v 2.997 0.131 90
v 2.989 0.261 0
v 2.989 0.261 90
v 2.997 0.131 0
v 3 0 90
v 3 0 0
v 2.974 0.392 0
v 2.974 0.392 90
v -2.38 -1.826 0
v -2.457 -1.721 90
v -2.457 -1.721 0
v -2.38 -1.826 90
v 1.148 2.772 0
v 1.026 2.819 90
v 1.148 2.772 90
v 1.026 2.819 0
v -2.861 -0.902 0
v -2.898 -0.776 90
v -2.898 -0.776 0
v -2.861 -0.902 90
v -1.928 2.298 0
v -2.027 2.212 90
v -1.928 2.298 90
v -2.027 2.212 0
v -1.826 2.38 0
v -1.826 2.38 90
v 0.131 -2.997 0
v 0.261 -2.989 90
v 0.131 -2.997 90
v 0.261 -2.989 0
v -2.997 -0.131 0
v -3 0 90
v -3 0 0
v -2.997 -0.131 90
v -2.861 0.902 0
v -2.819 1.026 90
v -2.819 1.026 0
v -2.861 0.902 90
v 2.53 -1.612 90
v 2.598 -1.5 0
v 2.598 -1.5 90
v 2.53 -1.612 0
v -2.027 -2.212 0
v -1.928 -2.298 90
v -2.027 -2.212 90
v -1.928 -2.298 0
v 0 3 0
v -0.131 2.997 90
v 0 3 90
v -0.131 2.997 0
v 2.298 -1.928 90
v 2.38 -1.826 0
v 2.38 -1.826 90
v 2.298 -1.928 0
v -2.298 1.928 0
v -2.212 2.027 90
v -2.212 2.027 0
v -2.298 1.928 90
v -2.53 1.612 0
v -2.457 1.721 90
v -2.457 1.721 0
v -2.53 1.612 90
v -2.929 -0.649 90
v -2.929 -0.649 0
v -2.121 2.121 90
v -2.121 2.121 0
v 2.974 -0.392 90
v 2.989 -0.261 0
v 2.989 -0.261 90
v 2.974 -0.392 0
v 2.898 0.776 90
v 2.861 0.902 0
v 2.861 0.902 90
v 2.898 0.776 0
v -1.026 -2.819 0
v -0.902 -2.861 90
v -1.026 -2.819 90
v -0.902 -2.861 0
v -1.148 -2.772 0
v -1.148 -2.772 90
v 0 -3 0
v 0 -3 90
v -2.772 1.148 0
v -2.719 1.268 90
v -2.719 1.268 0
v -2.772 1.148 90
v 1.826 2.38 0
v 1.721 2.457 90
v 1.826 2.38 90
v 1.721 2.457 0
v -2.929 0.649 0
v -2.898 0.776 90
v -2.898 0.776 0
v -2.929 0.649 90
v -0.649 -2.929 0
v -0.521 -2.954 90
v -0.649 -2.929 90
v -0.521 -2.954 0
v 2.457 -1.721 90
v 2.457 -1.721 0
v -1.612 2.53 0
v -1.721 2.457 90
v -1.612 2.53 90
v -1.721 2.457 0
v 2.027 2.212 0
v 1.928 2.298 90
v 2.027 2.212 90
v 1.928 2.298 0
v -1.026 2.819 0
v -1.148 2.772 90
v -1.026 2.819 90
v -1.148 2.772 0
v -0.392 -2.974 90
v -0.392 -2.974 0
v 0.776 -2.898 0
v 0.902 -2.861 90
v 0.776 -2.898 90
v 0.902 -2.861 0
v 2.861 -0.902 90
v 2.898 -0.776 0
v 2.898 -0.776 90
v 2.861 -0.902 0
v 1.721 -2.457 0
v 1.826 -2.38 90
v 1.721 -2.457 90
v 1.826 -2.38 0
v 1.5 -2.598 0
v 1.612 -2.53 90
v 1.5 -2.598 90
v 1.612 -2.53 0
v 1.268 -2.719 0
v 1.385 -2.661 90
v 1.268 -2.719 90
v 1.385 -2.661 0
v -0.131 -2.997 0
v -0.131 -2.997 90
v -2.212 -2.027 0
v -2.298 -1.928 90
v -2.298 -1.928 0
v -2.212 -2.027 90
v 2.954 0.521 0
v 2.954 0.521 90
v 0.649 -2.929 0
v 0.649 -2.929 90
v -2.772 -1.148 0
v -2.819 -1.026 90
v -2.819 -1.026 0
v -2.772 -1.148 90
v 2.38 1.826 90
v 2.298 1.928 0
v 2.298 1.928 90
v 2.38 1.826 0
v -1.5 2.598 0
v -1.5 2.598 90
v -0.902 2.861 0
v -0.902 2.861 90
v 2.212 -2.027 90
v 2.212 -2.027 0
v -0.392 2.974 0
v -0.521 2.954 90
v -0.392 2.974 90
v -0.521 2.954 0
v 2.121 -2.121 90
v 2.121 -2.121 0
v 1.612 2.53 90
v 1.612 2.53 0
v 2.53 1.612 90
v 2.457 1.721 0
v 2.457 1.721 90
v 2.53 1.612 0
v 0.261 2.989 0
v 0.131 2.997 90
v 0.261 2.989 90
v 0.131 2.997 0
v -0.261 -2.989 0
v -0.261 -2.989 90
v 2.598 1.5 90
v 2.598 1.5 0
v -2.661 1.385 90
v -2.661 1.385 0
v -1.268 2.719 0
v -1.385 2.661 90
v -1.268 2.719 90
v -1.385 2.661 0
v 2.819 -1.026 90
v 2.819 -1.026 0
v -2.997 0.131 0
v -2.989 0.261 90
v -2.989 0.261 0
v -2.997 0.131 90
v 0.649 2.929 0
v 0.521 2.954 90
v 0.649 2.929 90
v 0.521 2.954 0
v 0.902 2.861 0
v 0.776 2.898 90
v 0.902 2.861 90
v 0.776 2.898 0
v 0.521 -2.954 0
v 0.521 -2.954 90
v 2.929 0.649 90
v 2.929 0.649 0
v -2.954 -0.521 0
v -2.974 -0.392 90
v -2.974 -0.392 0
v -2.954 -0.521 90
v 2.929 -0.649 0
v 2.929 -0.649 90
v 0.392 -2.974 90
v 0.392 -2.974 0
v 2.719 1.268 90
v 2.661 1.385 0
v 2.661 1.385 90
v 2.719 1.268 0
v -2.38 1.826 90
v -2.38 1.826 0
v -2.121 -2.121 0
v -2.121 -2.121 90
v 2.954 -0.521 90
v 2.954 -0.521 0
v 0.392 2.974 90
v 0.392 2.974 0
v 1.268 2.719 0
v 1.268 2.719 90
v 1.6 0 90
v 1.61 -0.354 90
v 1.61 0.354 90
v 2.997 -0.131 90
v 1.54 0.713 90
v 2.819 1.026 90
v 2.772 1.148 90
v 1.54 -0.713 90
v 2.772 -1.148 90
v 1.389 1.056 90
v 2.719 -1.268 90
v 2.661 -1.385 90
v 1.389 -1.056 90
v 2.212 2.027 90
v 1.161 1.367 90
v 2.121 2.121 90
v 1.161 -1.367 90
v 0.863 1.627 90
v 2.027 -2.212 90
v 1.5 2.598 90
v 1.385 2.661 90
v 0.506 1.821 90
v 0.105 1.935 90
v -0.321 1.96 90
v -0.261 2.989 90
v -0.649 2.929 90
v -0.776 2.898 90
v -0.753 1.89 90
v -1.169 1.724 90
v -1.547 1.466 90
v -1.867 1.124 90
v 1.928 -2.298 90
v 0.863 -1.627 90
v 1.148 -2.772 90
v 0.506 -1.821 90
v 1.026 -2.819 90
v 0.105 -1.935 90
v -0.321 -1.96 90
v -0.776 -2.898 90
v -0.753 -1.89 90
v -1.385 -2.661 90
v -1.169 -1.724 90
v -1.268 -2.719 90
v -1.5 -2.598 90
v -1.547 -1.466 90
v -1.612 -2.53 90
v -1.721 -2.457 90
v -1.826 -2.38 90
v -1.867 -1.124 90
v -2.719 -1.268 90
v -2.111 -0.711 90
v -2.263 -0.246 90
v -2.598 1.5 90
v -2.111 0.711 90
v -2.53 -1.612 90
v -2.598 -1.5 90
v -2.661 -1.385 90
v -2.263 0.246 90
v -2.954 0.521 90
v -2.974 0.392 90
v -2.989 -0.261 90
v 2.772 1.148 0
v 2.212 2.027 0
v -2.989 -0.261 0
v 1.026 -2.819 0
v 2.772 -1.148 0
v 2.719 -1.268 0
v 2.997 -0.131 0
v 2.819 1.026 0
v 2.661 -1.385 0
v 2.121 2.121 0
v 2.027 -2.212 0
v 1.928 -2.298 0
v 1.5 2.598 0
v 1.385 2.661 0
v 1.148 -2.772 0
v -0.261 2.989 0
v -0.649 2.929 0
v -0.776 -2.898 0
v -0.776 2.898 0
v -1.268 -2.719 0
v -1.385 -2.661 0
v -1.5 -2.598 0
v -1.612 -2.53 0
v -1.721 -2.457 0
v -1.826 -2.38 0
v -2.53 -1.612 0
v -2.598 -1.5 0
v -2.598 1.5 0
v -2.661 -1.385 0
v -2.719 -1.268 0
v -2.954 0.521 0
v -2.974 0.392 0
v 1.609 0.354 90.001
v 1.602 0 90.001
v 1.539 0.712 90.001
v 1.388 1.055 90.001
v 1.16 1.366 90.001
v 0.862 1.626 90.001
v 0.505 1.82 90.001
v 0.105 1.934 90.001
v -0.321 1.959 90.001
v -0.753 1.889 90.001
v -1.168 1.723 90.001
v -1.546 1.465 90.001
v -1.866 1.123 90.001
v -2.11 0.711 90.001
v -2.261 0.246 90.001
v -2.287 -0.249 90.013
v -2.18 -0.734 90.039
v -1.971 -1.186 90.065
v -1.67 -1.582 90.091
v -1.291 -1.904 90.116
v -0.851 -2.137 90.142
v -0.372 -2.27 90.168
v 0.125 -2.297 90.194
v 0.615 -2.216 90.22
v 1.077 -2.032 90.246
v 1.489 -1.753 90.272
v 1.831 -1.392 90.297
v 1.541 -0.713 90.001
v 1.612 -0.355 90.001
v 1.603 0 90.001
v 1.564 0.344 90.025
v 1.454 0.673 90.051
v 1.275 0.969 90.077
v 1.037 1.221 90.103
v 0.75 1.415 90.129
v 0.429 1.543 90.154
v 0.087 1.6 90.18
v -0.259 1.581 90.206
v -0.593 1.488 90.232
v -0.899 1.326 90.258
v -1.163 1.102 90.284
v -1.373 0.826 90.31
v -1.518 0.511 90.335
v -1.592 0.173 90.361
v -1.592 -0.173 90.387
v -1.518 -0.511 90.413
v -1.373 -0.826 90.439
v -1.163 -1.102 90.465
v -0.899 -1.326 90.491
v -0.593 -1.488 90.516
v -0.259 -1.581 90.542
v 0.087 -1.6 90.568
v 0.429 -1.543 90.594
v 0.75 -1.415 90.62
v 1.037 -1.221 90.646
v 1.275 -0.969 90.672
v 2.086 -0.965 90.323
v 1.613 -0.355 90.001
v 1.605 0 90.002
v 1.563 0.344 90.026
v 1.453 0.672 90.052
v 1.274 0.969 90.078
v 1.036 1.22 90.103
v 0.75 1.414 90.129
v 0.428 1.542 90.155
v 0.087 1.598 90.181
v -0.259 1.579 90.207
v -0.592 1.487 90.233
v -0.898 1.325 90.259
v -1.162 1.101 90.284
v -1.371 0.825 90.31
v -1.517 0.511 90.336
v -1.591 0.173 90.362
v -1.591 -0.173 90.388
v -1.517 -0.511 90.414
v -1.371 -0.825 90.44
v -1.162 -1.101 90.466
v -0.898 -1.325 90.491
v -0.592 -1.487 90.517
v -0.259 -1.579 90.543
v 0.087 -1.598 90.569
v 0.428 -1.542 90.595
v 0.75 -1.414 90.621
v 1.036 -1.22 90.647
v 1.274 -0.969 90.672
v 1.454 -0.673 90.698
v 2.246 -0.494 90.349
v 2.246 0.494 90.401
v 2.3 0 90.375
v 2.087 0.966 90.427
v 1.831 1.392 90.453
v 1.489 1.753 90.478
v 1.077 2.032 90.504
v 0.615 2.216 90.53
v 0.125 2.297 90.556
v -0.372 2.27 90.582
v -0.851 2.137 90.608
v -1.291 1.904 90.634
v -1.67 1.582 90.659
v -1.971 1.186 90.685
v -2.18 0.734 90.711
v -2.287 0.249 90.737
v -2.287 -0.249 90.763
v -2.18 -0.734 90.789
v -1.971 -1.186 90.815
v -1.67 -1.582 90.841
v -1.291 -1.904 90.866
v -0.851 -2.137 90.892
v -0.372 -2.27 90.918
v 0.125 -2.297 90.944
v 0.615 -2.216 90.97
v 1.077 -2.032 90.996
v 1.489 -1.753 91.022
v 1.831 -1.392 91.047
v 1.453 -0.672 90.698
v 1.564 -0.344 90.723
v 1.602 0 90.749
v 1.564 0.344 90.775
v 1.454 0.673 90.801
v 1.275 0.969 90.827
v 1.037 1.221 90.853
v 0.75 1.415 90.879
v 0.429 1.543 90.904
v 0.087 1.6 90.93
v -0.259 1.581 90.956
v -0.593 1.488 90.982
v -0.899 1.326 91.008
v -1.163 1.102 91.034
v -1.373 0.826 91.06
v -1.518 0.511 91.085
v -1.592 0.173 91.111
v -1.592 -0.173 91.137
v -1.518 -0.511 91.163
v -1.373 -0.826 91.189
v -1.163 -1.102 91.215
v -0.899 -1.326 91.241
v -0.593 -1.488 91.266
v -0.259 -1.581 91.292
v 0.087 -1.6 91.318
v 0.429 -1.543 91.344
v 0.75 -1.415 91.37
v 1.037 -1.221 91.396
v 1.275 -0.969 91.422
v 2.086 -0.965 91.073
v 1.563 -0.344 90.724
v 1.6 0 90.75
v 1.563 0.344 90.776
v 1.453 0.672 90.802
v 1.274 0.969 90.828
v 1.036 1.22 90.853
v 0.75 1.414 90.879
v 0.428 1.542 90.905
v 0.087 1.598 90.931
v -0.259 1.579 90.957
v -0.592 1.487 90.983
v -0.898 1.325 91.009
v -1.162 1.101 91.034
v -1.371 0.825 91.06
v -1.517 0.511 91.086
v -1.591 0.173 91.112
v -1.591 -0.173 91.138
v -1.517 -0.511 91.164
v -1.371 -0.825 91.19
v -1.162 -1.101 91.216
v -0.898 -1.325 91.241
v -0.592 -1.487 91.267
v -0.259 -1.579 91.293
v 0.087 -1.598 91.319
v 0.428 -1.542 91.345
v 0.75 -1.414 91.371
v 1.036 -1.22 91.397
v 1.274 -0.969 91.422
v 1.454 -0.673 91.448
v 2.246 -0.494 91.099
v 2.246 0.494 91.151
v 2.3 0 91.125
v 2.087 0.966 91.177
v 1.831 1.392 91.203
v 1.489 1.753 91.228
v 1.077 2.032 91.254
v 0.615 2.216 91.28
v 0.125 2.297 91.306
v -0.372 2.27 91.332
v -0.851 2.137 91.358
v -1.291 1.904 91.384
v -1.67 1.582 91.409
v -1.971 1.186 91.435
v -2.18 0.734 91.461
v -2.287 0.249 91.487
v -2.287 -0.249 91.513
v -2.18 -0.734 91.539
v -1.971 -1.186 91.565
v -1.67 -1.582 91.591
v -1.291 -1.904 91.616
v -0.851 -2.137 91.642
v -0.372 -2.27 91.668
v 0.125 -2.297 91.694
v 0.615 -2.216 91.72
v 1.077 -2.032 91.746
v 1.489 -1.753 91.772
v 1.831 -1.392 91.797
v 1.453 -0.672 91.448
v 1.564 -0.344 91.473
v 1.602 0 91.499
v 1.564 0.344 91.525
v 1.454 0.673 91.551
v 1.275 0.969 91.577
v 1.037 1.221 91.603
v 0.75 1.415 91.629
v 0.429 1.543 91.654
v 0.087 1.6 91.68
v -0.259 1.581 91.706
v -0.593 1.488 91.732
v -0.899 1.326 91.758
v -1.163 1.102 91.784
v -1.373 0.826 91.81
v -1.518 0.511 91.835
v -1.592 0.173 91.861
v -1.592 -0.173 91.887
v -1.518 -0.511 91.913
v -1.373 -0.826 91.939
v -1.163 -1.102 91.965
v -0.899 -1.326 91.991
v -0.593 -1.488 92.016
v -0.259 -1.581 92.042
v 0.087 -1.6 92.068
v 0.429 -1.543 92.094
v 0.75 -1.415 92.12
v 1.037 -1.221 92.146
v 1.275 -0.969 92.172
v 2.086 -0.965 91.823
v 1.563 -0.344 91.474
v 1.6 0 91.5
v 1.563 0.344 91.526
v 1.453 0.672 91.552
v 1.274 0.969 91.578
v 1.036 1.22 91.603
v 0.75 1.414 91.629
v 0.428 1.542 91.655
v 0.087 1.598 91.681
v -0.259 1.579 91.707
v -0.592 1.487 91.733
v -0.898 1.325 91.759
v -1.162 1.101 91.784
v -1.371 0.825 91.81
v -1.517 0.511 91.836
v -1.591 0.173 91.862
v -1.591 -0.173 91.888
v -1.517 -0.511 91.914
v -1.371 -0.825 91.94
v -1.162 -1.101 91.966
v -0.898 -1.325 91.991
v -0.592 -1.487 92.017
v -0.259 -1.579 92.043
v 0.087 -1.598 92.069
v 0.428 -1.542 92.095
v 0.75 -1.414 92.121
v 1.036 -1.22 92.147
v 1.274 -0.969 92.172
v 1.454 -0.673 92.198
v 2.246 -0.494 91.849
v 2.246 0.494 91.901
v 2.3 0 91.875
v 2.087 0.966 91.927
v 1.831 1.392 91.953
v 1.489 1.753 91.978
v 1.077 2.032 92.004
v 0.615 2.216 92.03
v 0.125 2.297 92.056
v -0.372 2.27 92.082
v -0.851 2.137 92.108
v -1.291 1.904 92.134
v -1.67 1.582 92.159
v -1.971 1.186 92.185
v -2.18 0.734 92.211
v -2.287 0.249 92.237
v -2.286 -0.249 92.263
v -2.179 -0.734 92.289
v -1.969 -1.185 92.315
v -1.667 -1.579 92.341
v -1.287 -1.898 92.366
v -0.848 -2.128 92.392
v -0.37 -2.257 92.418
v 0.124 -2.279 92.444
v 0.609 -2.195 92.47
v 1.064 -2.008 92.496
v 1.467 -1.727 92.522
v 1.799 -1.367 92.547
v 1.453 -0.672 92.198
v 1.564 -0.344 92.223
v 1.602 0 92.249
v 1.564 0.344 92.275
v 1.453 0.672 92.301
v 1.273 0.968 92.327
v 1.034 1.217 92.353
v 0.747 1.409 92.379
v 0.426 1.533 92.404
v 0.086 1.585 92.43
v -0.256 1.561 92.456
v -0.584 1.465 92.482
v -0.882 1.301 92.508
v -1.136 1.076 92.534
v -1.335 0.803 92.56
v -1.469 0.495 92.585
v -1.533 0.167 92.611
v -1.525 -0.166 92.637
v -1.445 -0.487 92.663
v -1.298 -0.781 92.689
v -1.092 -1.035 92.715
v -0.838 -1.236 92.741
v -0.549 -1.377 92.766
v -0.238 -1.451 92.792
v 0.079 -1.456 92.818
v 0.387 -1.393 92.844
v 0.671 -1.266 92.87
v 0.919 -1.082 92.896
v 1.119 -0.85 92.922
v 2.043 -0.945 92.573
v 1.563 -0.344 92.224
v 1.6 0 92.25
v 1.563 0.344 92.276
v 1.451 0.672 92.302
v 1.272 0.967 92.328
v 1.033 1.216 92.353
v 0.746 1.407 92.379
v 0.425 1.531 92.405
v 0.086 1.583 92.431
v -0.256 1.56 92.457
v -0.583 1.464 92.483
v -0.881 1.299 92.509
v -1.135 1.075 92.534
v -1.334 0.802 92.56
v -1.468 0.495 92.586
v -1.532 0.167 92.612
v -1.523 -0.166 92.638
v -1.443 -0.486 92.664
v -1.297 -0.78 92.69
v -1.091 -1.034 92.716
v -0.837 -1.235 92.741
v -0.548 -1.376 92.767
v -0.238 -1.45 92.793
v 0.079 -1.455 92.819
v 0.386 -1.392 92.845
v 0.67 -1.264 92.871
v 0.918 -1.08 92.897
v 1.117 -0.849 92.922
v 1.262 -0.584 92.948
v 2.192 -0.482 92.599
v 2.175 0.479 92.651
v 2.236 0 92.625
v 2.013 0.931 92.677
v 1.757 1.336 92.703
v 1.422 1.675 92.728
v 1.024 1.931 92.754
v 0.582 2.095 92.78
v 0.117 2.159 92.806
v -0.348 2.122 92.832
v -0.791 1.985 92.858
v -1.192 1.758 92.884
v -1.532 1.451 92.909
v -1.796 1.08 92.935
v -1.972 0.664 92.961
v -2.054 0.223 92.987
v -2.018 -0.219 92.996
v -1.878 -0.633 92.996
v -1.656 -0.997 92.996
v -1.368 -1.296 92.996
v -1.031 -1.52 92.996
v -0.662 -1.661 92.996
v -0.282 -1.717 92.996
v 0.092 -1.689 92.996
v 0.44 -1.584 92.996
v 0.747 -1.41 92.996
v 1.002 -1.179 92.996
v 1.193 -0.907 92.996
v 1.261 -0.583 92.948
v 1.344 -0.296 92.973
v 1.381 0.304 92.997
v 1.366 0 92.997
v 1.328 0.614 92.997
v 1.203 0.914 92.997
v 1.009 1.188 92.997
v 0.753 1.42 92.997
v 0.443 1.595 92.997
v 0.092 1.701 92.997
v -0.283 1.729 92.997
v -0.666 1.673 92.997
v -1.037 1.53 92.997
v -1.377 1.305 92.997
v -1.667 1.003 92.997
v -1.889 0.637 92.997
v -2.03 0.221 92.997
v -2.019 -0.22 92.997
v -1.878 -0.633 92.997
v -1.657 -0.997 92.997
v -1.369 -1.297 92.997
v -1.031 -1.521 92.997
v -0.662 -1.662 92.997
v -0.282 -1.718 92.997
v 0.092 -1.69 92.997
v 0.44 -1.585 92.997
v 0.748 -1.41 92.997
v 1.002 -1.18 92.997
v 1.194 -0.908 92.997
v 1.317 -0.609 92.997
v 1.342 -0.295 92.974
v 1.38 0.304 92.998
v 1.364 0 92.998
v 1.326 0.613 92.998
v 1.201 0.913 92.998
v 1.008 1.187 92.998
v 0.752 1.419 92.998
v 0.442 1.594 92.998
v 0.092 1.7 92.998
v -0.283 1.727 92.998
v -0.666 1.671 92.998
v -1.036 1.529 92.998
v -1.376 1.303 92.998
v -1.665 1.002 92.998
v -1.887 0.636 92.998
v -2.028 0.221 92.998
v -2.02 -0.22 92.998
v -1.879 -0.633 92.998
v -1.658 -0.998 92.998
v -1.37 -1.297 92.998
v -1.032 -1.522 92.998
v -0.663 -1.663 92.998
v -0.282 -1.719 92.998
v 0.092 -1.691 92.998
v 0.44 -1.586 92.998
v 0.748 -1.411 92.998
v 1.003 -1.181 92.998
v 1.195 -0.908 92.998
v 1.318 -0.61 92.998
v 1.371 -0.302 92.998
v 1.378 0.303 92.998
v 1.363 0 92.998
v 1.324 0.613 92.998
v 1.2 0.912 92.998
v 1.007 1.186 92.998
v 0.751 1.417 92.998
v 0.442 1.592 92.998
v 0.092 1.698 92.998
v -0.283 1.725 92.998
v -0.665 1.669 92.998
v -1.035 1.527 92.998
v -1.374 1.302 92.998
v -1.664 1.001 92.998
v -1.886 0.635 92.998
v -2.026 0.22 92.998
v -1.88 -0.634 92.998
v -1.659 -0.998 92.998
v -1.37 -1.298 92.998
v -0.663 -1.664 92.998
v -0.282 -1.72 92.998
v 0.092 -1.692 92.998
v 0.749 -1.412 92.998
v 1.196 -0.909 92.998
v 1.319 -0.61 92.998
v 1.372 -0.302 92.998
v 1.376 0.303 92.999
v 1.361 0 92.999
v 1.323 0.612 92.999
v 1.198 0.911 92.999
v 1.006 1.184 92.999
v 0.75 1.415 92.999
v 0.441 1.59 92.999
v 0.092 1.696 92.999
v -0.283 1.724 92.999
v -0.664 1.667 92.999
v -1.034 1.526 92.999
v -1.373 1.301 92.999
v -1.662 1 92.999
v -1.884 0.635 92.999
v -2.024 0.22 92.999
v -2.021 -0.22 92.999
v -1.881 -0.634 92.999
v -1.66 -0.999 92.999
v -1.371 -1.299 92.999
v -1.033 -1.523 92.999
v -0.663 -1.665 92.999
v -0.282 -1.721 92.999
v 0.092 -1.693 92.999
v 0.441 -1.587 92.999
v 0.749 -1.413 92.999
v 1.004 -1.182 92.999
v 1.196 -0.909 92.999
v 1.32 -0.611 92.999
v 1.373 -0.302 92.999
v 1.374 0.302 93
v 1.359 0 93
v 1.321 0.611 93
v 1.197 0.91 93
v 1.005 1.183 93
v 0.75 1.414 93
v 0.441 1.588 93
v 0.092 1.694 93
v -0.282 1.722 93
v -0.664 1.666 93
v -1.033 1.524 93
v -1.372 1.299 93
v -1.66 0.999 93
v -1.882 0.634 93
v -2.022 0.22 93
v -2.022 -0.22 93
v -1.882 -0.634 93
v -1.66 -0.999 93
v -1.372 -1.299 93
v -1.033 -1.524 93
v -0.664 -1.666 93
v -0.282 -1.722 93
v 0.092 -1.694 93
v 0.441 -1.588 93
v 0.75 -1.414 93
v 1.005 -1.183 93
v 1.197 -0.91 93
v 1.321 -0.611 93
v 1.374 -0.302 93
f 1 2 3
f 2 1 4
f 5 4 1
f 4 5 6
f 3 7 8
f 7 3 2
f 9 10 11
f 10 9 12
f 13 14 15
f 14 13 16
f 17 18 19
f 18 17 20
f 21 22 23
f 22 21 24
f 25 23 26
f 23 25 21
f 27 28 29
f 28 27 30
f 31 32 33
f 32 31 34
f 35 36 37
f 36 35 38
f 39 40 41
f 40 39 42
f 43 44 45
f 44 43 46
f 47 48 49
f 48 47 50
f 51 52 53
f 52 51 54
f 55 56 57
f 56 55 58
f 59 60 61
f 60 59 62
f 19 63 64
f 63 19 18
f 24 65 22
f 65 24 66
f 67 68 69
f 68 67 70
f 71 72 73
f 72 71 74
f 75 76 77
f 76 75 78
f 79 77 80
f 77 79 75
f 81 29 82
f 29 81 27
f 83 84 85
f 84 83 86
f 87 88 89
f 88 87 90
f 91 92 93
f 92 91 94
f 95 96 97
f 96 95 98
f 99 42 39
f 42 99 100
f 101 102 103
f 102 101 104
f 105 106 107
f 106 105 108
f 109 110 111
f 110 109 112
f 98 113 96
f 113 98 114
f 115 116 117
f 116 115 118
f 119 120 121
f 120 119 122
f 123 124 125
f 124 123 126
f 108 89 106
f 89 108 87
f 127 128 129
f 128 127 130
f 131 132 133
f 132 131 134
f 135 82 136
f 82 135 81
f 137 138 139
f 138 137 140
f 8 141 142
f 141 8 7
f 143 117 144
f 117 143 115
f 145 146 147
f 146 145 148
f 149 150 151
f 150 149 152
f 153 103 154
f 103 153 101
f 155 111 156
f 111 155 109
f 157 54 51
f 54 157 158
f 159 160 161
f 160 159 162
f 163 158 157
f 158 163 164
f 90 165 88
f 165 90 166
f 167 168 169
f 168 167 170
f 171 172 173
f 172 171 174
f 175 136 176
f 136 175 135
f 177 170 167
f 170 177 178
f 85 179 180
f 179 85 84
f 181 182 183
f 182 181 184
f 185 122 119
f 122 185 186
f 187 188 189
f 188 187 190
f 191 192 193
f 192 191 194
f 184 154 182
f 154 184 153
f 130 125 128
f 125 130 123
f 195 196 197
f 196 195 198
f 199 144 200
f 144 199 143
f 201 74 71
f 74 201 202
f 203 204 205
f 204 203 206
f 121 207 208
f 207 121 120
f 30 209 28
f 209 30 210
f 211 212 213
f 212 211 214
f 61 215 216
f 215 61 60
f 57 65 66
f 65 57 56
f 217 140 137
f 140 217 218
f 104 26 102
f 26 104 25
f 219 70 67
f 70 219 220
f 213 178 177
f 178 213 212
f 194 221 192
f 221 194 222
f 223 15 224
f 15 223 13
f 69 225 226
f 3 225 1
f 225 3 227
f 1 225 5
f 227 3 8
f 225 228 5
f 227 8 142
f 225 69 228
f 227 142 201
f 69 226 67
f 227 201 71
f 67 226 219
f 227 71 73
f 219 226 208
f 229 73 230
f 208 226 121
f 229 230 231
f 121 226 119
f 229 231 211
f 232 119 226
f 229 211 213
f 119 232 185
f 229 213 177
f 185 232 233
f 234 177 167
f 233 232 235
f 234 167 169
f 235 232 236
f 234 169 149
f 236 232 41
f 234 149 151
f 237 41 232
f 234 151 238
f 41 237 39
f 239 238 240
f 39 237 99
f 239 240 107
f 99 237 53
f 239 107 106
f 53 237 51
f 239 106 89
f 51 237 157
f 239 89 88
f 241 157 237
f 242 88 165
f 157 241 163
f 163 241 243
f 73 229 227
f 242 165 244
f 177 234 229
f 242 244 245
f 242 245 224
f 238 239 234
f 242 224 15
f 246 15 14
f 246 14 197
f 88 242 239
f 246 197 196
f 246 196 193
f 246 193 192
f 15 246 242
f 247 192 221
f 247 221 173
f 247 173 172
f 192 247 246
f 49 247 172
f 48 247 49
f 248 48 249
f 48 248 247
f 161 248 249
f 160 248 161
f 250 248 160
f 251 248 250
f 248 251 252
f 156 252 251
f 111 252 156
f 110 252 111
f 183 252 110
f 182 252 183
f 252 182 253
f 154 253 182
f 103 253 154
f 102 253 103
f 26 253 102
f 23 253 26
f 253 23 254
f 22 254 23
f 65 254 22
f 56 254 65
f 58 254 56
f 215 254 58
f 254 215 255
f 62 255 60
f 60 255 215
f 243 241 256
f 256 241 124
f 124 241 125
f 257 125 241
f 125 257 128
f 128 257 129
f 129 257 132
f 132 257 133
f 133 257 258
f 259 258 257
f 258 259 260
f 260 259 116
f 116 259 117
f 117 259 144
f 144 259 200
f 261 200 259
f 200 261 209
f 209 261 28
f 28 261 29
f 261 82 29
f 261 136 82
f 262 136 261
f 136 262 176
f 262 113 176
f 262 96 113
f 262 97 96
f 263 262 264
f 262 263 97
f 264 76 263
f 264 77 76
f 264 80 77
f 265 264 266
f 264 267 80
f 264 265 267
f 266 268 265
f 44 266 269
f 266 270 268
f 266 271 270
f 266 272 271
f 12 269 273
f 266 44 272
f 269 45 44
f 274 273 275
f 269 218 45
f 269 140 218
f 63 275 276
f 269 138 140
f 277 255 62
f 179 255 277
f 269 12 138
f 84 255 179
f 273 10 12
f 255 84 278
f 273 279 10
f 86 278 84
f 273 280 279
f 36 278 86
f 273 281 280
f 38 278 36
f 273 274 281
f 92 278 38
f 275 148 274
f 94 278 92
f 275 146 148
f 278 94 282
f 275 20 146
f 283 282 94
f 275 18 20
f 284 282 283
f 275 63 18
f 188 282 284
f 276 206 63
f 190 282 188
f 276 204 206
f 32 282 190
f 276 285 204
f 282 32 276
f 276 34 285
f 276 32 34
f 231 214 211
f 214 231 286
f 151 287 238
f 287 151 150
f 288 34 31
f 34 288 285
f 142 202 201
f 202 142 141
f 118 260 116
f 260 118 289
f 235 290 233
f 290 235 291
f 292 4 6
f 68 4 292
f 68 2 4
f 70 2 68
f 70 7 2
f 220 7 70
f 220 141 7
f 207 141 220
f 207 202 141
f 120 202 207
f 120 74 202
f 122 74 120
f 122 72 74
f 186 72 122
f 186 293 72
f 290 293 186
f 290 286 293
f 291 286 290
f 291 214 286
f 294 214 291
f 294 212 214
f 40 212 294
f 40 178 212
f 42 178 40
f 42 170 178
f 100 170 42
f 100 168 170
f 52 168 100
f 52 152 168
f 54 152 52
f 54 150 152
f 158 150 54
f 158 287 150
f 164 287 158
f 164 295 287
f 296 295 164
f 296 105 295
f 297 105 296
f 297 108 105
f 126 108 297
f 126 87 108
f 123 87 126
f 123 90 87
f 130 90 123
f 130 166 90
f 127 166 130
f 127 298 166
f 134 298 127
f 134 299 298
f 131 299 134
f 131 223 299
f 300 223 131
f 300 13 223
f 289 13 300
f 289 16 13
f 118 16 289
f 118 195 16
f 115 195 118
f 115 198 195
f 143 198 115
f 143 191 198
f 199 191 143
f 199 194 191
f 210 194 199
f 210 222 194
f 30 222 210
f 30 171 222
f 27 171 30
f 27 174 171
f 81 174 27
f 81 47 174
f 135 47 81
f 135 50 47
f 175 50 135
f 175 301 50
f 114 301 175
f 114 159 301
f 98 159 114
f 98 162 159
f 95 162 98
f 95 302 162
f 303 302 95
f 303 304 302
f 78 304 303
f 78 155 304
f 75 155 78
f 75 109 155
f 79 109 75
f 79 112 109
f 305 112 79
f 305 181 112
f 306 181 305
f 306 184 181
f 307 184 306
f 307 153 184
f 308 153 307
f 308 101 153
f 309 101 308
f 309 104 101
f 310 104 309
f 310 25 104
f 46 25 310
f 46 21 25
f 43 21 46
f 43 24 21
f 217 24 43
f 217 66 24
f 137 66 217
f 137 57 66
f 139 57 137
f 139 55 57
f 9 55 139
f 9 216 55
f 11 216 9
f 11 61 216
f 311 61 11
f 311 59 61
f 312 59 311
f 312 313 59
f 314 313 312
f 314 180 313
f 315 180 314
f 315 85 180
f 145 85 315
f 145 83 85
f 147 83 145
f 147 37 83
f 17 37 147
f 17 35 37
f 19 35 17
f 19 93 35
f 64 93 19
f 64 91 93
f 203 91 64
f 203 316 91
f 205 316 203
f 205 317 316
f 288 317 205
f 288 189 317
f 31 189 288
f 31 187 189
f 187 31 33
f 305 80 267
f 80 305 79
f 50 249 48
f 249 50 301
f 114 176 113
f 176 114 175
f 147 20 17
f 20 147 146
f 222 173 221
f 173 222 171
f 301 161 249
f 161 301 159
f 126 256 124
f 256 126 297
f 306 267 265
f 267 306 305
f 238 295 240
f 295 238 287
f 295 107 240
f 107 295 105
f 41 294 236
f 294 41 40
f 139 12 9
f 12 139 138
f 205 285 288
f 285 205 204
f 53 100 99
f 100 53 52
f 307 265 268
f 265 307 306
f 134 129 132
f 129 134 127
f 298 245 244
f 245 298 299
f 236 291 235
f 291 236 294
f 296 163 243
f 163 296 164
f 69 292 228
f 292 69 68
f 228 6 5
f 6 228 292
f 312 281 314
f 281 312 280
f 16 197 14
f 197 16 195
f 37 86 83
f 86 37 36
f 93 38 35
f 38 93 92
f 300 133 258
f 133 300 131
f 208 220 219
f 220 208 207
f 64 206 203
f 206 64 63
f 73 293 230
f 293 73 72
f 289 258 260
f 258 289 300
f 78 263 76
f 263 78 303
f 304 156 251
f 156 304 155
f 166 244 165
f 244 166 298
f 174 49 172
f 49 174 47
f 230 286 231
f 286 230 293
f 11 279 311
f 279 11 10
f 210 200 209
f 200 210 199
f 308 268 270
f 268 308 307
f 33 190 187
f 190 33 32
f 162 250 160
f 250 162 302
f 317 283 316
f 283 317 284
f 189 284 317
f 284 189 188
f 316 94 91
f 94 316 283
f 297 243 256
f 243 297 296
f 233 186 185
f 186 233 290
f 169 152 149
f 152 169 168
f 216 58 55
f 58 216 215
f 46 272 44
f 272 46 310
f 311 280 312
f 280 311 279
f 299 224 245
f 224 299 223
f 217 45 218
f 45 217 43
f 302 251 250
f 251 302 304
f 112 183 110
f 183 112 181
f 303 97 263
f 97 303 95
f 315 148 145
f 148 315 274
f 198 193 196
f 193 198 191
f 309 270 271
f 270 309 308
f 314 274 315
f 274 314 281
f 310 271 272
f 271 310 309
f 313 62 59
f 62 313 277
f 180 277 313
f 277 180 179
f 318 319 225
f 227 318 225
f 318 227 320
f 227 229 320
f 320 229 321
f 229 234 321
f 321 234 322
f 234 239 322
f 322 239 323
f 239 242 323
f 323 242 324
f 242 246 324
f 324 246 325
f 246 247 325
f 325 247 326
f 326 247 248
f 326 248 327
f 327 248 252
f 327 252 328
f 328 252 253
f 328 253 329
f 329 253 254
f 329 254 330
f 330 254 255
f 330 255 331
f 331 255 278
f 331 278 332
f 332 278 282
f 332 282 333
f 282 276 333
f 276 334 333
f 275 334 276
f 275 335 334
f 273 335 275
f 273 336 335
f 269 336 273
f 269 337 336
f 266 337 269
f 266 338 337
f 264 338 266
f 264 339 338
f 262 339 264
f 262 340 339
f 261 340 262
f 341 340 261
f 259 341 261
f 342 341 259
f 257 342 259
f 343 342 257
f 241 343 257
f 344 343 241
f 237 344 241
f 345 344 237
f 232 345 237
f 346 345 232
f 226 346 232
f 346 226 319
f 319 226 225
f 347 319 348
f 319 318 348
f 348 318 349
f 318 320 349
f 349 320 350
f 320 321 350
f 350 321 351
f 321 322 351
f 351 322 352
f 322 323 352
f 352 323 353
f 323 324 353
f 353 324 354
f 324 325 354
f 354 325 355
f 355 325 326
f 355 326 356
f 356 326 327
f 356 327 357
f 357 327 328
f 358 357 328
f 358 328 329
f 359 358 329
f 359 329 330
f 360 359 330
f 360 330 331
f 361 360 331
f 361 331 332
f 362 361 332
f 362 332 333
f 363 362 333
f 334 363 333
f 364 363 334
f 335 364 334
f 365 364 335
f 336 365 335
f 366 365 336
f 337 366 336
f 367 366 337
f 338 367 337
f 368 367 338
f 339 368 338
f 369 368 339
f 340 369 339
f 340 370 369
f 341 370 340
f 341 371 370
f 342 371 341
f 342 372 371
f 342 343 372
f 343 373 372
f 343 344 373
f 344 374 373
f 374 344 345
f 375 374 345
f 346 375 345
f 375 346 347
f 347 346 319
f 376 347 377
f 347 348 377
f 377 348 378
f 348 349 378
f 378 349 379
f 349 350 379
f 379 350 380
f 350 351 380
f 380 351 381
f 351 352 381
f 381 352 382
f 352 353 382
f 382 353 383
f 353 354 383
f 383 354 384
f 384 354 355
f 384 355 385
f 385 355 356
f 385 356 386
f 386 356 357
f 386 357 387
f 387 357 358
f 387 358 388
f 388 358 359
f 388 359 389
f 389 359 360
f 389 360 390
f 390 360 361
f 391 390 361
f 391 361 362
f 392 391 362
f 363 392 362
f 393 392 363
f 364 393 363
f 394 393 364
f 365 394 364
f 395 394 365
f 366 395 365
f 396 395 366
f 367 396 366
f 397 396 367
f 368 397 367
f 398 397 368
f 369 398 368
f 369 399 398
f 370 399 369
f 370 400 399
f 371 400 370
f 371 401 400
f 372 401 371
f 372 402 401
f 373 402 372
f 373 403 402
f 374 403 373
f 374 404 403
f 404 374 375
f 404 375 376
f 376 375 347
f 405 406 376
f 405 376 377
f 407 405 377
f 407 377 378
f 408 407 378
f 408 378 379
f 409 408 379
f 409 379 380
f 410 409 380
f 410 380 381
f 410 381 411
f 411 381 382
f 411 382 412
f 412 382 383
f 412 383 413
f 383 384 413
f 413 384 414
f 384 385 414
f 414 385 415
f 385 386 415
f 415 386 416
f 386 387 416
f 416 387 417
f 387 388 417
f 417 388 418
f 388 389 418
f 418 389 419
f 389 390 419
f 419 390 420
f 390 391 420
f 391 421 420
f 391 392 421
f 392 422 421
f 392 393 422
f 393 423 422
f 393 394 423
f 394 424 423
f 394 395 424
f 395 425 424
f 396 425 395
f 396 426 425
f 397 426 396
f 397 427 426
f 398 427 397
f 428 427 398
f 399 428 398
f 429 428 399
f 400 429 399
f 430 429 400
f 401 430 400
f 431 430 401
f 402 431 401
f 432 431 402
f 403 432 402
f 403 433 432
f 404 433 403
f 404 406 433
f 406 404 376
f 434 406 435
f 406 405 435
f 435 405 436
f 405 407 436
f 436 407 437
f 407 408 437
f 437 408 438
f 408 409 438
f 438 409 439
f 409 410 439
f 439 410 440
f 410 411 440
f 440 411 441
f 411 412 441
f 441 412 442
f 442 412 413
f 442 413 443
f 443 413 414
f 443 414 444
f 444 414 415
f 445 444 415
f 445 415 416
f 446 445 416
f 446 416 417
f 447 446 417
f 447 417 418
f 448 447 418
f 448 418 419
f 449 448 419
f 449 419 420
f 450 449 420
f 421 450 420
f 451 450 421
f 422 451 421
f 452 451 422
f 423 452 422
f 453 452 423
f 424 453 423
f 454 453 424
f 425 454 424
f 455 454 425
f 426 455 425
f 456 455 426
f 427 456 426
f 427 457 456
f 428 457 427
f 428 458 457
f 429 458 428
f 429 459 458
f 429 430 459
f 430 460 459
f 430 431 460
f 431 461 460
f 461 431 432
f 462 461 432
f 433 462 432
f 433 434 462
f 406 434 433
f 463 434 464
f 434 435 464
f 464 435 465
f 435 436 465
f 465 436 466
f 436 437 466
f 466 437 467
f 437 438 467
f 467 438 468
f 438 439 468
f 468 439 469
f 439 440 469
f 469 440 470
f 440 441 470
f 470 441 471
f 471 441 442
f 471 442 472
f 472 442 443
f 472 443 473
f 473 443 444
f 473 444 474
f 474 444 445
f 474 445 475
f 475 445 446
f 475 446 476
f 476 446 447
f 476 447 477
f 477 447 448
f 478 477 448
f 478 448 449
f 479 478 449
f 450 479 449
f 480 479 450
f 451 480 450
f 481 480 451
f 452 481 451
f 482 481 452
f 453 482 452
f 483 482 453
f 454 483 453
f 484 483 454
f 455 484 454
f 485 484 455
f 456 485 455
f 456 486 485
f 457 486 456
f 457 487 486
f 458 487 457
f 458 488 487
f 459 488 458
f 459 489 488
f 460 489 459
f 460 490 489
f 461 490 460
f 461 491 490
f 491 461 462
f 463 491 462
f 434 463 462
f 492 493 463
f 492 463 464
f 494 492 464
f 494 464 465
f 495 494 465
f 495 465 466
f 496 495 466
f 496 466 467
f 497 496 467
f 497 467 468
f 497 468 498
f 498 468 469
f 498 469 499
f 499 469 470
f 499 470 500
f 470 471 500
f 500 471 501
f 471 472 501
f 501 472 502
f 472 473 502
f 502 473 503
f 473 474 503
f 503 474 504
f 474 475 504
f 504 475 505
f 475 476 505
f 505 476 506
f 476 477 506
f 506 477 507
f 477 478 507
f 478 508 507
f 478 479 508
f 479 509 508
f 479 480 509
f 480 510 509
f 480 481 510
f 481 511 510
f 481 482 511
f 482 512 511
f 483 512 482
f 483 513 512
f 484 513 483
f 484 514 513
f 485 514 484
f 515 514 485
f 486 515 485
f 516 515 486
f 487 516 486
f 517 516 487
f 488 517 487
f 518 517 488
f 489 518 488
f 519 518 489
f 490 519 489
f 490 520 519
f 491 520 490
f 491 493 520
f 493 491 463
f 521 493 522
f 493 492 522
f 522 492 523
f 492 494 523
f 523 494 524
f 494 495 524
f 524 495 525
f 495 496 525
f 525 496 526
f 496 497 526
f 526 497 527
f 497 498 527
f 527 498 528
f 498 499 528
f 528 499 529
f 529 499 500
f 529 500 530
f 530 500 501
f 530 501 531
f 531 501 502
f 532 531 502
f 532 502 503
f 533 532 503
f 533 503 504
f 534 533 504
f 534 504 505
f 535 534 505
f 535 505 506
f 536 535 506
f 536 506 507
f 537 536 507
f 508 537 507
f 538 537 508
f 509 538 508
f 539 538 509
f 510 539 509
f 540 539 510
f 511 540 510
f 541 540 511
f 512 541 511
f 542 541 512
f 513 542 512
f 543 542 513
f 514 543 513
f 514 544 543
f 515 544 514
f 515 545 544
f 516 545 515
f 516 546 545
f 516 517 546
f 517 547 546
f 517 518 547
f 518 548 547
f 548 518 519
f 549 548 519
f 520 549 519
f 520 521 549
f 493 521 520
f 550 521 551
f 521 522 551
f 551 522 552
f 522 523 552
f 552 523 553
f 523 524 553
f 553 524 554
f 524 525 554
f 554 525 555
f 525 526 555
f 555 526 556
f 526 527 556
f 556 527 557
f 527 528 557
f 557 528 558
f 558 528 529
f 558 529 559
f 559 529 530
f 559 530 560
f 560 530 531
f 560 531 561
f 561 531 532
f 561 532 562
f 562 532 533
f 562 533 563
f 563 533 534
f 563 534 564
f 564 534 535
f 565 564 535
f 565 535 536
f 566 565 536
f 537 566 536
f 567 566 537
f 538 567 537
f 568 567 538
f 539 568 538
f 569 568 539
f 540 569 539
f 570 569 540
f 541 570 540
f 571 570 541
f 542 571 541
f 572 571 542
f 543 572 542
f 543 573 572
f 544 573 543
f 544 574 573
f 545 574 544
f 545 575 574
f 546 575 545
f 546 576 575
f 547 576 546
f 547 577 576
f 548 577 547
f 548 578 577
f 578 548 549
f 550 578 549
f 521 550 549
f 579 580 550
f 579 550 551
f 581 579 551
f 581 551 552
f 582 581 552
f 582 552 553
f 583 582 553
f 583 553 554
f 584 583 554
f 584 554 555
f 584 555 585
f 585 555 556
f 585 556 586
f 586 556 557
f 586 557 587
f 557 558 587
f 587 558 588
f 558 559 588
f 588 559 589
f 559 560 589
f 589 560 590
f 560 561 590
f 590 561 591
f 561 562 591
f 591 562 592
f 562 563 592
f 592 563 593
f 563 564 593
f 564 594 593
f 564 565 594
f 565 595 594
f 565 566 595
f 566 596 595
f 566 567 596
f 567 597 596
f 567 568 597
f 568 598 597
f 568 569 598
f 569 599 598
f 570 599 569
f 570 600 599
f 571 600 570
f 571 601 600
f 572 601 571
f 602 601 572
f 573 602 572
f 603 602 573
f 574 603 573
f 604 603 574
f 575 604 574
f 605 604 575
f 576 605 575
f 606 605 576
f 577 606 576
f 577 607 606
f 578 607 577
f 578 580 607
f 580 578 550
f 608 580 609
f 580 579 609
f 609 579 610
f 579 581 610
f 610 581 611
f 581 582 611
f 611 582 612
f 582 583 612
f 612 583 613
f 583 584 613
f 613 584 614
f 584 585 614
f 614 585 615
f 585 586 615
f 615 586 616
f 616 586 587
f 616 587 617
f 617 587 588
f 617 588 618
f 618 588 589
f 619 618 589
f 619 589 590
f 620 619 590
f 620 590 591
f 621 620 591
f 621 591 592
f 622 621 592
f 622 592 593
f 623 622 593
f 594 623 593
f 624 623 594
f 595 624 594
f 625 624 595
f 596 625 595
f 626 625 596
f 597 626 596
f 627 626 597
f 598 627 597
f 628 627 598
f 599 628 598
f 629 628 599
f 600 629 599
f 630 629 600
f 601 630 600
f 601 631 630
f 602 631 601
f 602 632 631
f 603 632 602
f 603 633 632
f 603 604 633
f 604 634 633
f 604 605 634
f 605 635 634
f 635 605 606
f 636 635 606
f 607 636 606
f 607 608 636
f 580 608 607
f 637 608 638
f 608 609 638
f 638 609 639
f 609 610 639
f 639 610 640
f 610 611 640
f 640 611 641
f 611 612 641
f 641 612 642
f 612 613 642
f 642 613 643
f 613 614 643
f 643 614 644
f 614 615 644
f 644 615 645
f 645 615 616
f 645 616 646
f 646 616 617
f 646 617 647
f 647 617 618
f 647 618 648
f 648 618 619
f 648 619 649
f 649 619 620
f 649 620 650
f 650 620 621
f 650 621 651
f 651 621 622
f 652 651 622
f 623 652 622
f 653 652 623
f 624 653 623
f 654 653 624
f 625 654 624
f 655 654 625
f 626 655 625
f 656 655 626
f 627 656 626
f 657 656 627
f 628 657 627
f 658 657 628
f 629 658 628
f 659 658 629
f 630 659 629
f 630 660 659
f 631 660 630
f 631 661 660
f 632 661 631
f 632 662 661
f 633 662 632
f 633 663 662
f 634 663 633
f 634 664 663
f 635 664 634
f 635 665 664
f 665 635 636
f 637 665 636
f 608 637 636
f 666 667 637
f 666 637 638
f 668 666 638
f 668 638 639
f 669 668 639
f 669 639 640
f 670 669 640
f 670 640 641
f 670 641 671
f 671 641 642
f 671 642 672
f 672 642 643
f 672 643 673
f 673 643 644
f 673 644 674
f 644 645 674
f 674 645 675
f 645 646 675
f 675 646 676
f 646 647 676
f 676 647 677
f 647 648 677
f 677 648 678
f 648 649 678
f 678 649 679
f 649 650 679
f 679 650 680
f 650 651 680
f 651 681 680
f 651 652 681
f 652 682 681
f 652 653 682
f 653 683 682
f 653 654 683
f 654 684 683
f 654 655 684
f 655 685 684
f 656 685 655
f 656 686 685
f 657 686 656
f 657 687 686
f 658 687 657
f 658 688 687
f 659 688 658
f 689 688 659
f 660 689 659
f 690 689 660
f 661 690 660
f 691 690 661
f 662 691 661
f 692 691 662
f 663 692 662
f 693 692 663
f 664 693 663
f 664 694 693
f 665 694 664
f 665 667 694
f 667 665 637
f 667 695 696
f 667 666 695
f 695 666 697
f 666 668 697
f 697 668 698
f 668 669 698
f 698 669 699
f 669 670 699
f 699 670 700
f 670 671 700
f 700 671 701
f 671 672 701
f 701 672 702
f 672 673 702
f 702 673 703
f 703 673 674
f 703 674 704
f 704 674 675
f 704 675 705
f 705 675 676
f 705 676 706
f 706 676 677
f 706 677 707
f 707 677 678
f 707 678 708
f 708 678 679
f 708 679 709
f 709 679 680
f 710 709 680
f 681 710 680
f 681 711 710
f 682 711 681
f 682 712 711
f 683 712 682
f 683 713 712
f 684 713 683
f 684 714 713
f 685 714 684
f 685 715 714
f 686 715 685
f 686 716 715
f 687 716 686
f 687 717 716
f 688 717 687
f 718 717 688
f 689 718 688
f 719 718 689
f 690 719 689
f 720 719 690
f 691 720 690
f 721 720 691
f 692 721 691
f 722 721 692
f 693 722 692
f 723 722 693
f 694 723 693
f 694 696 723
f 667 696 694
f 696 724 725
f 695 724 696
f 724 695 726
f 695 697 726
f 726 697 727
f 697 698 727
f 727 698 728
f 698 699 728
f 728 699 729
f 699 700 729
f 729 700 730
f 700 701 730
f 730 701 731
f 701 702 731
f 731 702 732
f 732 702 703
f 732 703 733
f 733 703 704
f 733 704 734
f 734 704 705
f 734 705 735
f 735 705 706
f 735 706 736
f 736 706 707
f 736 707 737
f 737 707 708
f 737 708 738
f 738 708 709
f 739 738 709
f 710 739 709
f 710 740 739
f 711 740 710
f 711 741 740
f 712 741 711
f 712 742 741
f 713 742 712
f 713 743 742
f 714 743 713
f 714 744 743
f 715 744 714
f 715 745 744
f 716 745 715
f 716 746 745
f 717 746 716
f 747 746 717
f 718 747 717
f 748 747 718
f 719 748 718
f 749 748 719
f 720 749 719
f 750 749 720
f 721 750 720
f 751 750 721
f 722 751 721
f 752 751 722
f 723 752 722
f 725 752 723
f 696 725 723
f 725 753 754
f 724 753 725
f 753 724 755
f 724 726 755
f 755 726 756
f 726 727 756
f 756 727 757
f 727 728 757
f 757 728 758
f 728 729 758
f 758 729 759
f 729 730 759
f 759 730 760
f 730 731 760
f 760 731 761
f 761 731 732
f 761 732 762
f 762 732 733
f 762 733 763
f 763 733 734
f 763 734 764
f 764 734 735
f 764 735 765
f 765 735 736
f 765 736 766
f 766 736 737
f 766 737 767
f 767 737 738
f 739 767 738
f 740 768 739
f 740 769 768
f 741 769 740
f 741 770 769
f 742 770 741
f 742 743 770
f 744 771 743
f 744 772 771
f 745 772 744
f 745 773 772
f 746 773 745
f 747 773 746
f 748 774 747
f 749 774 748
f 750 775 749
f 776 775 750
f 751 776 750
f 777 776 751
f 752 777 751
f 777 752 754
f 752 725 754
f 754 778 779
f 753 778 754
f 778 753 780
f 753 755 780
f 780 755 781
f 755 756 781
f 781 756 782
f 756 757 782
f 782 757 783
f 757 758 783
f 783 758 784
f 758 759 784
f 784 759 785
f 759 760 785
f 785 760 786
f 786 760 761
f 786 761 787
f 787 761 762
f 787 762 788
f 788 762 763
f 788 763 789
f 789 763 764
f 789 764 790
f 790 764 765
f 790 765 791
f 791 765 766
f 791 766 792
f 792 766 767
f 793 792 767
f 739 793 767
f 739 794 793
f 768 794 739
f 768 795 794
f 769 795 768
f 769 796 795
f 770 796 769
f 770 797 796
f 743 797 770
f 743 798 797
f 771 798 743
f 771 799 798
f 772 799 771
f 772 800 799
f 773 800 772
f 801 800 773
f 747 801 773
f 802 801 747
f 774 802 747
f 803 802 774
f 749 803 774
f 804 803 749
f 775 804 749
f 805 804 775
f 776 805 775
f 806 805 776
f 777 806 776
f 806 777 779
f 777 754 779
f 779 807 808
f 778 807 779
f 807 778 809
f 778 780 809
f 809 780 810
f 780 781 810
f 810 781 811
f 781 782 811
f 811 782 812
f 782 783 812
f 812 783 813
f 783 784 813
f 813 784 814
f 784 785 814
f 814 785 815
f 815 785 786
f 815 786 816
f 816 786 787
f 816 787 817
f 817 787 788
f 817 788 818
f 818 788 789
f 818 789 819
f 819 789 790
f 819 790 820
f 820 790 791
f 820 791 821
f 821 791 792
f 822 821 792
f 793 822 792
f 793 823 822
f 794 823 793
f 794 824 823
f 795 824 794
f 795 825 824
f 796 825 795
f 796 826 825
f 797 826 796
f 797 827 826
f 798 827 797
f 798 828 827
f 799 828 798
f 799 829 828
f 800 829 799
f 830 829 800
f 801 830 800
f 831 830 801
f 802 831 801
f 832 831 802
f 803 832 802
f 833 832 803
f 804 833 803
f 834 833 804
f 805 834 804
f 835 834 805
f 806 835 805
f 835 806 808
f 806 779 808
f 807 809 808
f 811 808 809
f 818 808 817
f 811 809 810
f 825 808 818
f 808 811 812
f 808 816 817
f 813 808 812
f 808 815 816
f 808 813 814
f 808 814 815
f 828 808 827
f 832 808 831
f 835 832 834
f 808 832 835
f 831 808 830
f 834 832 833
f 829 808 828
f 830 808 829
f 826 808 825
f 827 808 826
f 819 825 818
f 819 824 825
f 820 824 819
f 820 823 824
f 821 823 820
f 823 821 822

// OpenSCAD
// Created 2016-2017 by Ryan A. Colyer.
// This work is released with CC0 into the public domain.
// https://creativecommons.org/publicdomain/zero/1.0/
//
// https://www.thingiverse.com/thing:1686322
//
// v2.1

$fn = 100;

screw_resolution = 0.5;  // in mm

// Legs
leg_diameter = 6;
leg_height = 90;

// Provides standard metric thread pitches.
function ThreadPitch(diameter) =
  (diameter <= 64) ?
    lookup(diameter, [
      [2, 0.4],
      [2.5, 0.45],
      [3, 0.5],
      [4, 0.7],
      [5, 0.8],
      [6, 1.0],
      [7, 1.0],
      [8, 1.25],
      [10, 1.5],
      [12, 1.75],
      [14, 2.0],
      [16, 2.0],
      [18, 2.5],
      [20, 2.5],
      [22, 2.5],
      [24, 3.0],
      [27, 3.0],
      [30, 3.5],
      [33, 3.5],
      [36, 4.0],
      [39, 4.0],
      [42, 4.5],
      [48, 5.0],
      [52, 5.0],
      [56, 5.5],
      [60, 5.5],
      [64, 6.0]
    ]) :
    diameter * 6.0 / 64;


// This generates a closed polyhedron from an array of arrays of points,
// with each inner array tracing out one loop outlining the polyhedron.
// pointarrays should contain an array of N arrays each of size P outlining a
// closed manifold.  The points must obey the right-hand rule.  For example,
// looking down, the P points in the inner arrays are counter-clockwise in a
// loop, while the N point arrays increase in height.  Points in each inner
// array do not need to be equal height, but they usually should not meet or
// cross the line segments from the adjacent points in the other arrays.
// (N>=2, P>=3)
// Core triangles:
//   [j][i], [j+1][i], [j+1][(i+1)%P]
//   [j][i], [j+1][(i+1)%P], [j][(i+1)%P]
//   Then triangles are formed in a loop with the middle point of the first
//   and last array.
module ClosePoints(pointarrays) {
  function recurse_avg(arr, n=0, p=[0,0,0]) = (n>=len(arr)) ? p :
    recurse_avg(arr, n+1, p+(arr[n]-p)/(n+1));

  N = len(pointarrays);
  P = len(pointarrays[0]);
  NP = N*P;
  lastarr = pointarrays[N-1];
  midbot = recurse_avg(pointarrays[0]);
  midtop = recurse_avg(pointarrays[N-1]);

  faces_bot = [
    for (i=[0:P-1])
      [0,i+1,1+(i+1)%len(pointarrays[0])]
  ];

  loop_offset = 1;
  bot_len = loop_offset + P;

  faces_loop = [
    for (j=[0:N-2], i=[0:P-1], t=[0:1])
      [loop_offset, loop_offset, loop_offset] + (t==0 ?
      [j*P+i, (j+1)*P+i, (j+1)*P+(i+1)%P] :
      [j*P+i, (j+1)*P+(i+1)%P, j*P+(i+1)%P])
  ];

  top_offset = loop_offset + NP - P;
  midtop_offset = top_offset + P;

  faces_top = [
    for (i=[0:P-1])
      [midtop_offset,top_offset+(i+1)%P,top_offset+i]
  ];

  points = [
    for (i=[-1:NP])
      (i<0) ? midbot :
      ((i==NP) ? midtop :
      pointarrays[floor(i/P)][i%P])
  ];
  faces = concat(faces_bot, faces_loop, faces_top);

  polyhedron(points=points, faces=faces);
}

// This creates a vertical rod at the origin with external threads.  It uses
// metric standards by default.
module ScrewThread(outer_diam, height, pitch=0, tooth_angle=30, tolerance=0.4, tip_height=0, tooth_height=0, tip_min_fract=0) {

  pitch = (pitch==0) ? ThreadPitch(outer_diam) : pitch;
  tooth_height = (tooth_height==0) ? pitch : tooth_height;
  tip_min_fract = (tip_min_fract<0) ? 0 :
    ((tip_min_fract>0.9999) ? 0.9999 : tip_min_fract);

  outer_diam_cor = outer_diam + 0.25*tolerance; // Plastic shrinkage correction
  inner_diam = outer_diam - tooth_height/tan(tooth_angle);
  or = (outer_diam_cor < screw_resolution) ?
    screw_resolution/2 : outer_diam_cor / 2;
  ir = (inner_diam < screw_resolution) ? screw_resolution/2 : inner_diam / 2;
  height = (height < screw_resolution) ? screw_resolution : height;

  steps_per_loop_try = ceil(2*3.14159265359*or / screw_resolution);
  steps_per_loop = (steps_per_loop_try < 4) ? 4 : steps_per_loop_try;
  hs_ext = 3;
  hsteps = ceil(3 * height / pitch) + 2*hs_ext;

  extent = or - ir;

  tip_start = height-tip_height;
  tip_height_sc = tip_height / (1-tip_min_fract);

  tip_height_ir = (tip_height_sc > tooth_height/2) ?
    tip_height_sc - tooth_height/2 : tip_height_sc;

  tip_height_w = (tip_height_sc > tooth_height) ? tooth_height : tip_height_sc;
  tip_wstart = height + tip_height_sc - tip_height - tip_height_w;


  function tooth_width(a, h, pitch, tooth_height, extent) =
    let(
      ang_full = h*360.0/pitch-a,
      ang_pn = atan2(sin(ang_full), cos(ang_full)),
      ang = ang_pn < 0 ? ang_pn+360 : ang_pn,
      frac = ang/360,
      tfrac_half = tooth_height / (2*pitch),
      tfrac_cut = 2*tfrac_half
    )
    (frac > tfrac_cut) ? 0 : (
      (frac <= tfrac_half) ?
        ((frac / tfrac_half) * extent) :
        ((1 - (frac - tfrac_half)/tfrac_half) * extent)
    );


  pointarrays = [
    for (hs=[0:hsteps])
      [
        for (s=[0:steps_per_loop-1])
          let(
            ang_full = s*360.0/steps_per_loop,
            ang_pn = atan2(sin(ang_full), cos(ang_full)),
            ang = ang_pn < 0 ? ang_pn+360 : ang_pn,

            h_fudge = pitch*0.001,

            h_mod =
              (hs%3 == 2) ?
                ((s == steps_per_loop-1) ? tooth_height - h_fudge : (
                 (s == steps_per_loop-2) ? tooth_height/2 : 0)) : (
              (hs%3 == 0) ?
                ((s == steps_per_loop-1) ? pitch-tooth_height/2 : (
                 (s == steps_per_loop-2) ? pitch-tooth_height + h_fudge : 0)) :
                ((s == steps_per_loop-1) ? pitch-tooth_height/2 + h_fudge : (
                 (s == steps_per_loop-2) ? tooth_height/2 : 0))
              ),

            h_level =
              (hs%3 == 2) ? tooth_height - h_fudge : (
              (hs%3 == 0) ? 0 : tooth_height/2),

            h_ub = floor((hs-hs_ext)/3) * pitch
              + h_level + ang*pitch/360.0 - h_mod,
            h_max = height - (hsteps-hs) * h_fudge,
            h_min = hs * h_fudge,
            h = (h_ub < h_min) ? h_min : ((h_ub > h_max) ? h_max : h_ub),

            ht = h - tip_start,
            hf_ir = ht/tip_height_ir,
            ht_w = h - tip_wstart,
            hf_w_t = ht_w/tip_height_w,
            hf_w = (hf_w_t < 0) ? 0 : ((hf_w_t > 1) ? 1 : hf_w_t),

            ext_tip = (h <= tip_wstart) ? extent : (1-hf_w) * extent,
            wnormal = tooth_width(ang, h, pitch, tooth_height, ext_tip),
            w = (h <= tip_wstart) ? wnormal :
              (1-hf_w) * wnormal +
              hf_w * (0.1*screw_resolution + (wnormal * wnormal * wnormal /
                (ext_tip*ext_tip+0.1*screw_resolution))),
            r = (ht <= 0) ? ir + w :
              ( (ht < tip_height_ir ? ((2/(1+(hf_ir*hf_ir))-1) * ir) : 0) + w)
          )
          [r*cos(ang), r*sin(ang), h]
      ]
  ];


  ClosePoints(pointarrays);
}

// Solid rod on the bottom, external threads on the top.
module RodStart(height, diameter, thread_len=0, thread_diam=0, thread_pitch=0) {
  // A reasonable default.
  thread_diam = (thread_diam==0) ? 0.75*diameter : thread_diam;
  thread_len = (thread_len==0) ? 0.5*diameter : thread_len;
  thread_pitch = (thread_pitch==0) ? ThreadPitch(thread_diam) : thread_pitch;

  cylinder(r=diameter/2, h=height, $fn=24*diameter);

  translate([0, 0, height])
    ScrewThread(thread_diam, thread_len, thread_pitch,
      tip_height=thread_pitch, tip_min_fract=0.75);
}

// Legs
module leg() {
  RodStart(leg_height, leg_diameter);
}

// Render
leg();
